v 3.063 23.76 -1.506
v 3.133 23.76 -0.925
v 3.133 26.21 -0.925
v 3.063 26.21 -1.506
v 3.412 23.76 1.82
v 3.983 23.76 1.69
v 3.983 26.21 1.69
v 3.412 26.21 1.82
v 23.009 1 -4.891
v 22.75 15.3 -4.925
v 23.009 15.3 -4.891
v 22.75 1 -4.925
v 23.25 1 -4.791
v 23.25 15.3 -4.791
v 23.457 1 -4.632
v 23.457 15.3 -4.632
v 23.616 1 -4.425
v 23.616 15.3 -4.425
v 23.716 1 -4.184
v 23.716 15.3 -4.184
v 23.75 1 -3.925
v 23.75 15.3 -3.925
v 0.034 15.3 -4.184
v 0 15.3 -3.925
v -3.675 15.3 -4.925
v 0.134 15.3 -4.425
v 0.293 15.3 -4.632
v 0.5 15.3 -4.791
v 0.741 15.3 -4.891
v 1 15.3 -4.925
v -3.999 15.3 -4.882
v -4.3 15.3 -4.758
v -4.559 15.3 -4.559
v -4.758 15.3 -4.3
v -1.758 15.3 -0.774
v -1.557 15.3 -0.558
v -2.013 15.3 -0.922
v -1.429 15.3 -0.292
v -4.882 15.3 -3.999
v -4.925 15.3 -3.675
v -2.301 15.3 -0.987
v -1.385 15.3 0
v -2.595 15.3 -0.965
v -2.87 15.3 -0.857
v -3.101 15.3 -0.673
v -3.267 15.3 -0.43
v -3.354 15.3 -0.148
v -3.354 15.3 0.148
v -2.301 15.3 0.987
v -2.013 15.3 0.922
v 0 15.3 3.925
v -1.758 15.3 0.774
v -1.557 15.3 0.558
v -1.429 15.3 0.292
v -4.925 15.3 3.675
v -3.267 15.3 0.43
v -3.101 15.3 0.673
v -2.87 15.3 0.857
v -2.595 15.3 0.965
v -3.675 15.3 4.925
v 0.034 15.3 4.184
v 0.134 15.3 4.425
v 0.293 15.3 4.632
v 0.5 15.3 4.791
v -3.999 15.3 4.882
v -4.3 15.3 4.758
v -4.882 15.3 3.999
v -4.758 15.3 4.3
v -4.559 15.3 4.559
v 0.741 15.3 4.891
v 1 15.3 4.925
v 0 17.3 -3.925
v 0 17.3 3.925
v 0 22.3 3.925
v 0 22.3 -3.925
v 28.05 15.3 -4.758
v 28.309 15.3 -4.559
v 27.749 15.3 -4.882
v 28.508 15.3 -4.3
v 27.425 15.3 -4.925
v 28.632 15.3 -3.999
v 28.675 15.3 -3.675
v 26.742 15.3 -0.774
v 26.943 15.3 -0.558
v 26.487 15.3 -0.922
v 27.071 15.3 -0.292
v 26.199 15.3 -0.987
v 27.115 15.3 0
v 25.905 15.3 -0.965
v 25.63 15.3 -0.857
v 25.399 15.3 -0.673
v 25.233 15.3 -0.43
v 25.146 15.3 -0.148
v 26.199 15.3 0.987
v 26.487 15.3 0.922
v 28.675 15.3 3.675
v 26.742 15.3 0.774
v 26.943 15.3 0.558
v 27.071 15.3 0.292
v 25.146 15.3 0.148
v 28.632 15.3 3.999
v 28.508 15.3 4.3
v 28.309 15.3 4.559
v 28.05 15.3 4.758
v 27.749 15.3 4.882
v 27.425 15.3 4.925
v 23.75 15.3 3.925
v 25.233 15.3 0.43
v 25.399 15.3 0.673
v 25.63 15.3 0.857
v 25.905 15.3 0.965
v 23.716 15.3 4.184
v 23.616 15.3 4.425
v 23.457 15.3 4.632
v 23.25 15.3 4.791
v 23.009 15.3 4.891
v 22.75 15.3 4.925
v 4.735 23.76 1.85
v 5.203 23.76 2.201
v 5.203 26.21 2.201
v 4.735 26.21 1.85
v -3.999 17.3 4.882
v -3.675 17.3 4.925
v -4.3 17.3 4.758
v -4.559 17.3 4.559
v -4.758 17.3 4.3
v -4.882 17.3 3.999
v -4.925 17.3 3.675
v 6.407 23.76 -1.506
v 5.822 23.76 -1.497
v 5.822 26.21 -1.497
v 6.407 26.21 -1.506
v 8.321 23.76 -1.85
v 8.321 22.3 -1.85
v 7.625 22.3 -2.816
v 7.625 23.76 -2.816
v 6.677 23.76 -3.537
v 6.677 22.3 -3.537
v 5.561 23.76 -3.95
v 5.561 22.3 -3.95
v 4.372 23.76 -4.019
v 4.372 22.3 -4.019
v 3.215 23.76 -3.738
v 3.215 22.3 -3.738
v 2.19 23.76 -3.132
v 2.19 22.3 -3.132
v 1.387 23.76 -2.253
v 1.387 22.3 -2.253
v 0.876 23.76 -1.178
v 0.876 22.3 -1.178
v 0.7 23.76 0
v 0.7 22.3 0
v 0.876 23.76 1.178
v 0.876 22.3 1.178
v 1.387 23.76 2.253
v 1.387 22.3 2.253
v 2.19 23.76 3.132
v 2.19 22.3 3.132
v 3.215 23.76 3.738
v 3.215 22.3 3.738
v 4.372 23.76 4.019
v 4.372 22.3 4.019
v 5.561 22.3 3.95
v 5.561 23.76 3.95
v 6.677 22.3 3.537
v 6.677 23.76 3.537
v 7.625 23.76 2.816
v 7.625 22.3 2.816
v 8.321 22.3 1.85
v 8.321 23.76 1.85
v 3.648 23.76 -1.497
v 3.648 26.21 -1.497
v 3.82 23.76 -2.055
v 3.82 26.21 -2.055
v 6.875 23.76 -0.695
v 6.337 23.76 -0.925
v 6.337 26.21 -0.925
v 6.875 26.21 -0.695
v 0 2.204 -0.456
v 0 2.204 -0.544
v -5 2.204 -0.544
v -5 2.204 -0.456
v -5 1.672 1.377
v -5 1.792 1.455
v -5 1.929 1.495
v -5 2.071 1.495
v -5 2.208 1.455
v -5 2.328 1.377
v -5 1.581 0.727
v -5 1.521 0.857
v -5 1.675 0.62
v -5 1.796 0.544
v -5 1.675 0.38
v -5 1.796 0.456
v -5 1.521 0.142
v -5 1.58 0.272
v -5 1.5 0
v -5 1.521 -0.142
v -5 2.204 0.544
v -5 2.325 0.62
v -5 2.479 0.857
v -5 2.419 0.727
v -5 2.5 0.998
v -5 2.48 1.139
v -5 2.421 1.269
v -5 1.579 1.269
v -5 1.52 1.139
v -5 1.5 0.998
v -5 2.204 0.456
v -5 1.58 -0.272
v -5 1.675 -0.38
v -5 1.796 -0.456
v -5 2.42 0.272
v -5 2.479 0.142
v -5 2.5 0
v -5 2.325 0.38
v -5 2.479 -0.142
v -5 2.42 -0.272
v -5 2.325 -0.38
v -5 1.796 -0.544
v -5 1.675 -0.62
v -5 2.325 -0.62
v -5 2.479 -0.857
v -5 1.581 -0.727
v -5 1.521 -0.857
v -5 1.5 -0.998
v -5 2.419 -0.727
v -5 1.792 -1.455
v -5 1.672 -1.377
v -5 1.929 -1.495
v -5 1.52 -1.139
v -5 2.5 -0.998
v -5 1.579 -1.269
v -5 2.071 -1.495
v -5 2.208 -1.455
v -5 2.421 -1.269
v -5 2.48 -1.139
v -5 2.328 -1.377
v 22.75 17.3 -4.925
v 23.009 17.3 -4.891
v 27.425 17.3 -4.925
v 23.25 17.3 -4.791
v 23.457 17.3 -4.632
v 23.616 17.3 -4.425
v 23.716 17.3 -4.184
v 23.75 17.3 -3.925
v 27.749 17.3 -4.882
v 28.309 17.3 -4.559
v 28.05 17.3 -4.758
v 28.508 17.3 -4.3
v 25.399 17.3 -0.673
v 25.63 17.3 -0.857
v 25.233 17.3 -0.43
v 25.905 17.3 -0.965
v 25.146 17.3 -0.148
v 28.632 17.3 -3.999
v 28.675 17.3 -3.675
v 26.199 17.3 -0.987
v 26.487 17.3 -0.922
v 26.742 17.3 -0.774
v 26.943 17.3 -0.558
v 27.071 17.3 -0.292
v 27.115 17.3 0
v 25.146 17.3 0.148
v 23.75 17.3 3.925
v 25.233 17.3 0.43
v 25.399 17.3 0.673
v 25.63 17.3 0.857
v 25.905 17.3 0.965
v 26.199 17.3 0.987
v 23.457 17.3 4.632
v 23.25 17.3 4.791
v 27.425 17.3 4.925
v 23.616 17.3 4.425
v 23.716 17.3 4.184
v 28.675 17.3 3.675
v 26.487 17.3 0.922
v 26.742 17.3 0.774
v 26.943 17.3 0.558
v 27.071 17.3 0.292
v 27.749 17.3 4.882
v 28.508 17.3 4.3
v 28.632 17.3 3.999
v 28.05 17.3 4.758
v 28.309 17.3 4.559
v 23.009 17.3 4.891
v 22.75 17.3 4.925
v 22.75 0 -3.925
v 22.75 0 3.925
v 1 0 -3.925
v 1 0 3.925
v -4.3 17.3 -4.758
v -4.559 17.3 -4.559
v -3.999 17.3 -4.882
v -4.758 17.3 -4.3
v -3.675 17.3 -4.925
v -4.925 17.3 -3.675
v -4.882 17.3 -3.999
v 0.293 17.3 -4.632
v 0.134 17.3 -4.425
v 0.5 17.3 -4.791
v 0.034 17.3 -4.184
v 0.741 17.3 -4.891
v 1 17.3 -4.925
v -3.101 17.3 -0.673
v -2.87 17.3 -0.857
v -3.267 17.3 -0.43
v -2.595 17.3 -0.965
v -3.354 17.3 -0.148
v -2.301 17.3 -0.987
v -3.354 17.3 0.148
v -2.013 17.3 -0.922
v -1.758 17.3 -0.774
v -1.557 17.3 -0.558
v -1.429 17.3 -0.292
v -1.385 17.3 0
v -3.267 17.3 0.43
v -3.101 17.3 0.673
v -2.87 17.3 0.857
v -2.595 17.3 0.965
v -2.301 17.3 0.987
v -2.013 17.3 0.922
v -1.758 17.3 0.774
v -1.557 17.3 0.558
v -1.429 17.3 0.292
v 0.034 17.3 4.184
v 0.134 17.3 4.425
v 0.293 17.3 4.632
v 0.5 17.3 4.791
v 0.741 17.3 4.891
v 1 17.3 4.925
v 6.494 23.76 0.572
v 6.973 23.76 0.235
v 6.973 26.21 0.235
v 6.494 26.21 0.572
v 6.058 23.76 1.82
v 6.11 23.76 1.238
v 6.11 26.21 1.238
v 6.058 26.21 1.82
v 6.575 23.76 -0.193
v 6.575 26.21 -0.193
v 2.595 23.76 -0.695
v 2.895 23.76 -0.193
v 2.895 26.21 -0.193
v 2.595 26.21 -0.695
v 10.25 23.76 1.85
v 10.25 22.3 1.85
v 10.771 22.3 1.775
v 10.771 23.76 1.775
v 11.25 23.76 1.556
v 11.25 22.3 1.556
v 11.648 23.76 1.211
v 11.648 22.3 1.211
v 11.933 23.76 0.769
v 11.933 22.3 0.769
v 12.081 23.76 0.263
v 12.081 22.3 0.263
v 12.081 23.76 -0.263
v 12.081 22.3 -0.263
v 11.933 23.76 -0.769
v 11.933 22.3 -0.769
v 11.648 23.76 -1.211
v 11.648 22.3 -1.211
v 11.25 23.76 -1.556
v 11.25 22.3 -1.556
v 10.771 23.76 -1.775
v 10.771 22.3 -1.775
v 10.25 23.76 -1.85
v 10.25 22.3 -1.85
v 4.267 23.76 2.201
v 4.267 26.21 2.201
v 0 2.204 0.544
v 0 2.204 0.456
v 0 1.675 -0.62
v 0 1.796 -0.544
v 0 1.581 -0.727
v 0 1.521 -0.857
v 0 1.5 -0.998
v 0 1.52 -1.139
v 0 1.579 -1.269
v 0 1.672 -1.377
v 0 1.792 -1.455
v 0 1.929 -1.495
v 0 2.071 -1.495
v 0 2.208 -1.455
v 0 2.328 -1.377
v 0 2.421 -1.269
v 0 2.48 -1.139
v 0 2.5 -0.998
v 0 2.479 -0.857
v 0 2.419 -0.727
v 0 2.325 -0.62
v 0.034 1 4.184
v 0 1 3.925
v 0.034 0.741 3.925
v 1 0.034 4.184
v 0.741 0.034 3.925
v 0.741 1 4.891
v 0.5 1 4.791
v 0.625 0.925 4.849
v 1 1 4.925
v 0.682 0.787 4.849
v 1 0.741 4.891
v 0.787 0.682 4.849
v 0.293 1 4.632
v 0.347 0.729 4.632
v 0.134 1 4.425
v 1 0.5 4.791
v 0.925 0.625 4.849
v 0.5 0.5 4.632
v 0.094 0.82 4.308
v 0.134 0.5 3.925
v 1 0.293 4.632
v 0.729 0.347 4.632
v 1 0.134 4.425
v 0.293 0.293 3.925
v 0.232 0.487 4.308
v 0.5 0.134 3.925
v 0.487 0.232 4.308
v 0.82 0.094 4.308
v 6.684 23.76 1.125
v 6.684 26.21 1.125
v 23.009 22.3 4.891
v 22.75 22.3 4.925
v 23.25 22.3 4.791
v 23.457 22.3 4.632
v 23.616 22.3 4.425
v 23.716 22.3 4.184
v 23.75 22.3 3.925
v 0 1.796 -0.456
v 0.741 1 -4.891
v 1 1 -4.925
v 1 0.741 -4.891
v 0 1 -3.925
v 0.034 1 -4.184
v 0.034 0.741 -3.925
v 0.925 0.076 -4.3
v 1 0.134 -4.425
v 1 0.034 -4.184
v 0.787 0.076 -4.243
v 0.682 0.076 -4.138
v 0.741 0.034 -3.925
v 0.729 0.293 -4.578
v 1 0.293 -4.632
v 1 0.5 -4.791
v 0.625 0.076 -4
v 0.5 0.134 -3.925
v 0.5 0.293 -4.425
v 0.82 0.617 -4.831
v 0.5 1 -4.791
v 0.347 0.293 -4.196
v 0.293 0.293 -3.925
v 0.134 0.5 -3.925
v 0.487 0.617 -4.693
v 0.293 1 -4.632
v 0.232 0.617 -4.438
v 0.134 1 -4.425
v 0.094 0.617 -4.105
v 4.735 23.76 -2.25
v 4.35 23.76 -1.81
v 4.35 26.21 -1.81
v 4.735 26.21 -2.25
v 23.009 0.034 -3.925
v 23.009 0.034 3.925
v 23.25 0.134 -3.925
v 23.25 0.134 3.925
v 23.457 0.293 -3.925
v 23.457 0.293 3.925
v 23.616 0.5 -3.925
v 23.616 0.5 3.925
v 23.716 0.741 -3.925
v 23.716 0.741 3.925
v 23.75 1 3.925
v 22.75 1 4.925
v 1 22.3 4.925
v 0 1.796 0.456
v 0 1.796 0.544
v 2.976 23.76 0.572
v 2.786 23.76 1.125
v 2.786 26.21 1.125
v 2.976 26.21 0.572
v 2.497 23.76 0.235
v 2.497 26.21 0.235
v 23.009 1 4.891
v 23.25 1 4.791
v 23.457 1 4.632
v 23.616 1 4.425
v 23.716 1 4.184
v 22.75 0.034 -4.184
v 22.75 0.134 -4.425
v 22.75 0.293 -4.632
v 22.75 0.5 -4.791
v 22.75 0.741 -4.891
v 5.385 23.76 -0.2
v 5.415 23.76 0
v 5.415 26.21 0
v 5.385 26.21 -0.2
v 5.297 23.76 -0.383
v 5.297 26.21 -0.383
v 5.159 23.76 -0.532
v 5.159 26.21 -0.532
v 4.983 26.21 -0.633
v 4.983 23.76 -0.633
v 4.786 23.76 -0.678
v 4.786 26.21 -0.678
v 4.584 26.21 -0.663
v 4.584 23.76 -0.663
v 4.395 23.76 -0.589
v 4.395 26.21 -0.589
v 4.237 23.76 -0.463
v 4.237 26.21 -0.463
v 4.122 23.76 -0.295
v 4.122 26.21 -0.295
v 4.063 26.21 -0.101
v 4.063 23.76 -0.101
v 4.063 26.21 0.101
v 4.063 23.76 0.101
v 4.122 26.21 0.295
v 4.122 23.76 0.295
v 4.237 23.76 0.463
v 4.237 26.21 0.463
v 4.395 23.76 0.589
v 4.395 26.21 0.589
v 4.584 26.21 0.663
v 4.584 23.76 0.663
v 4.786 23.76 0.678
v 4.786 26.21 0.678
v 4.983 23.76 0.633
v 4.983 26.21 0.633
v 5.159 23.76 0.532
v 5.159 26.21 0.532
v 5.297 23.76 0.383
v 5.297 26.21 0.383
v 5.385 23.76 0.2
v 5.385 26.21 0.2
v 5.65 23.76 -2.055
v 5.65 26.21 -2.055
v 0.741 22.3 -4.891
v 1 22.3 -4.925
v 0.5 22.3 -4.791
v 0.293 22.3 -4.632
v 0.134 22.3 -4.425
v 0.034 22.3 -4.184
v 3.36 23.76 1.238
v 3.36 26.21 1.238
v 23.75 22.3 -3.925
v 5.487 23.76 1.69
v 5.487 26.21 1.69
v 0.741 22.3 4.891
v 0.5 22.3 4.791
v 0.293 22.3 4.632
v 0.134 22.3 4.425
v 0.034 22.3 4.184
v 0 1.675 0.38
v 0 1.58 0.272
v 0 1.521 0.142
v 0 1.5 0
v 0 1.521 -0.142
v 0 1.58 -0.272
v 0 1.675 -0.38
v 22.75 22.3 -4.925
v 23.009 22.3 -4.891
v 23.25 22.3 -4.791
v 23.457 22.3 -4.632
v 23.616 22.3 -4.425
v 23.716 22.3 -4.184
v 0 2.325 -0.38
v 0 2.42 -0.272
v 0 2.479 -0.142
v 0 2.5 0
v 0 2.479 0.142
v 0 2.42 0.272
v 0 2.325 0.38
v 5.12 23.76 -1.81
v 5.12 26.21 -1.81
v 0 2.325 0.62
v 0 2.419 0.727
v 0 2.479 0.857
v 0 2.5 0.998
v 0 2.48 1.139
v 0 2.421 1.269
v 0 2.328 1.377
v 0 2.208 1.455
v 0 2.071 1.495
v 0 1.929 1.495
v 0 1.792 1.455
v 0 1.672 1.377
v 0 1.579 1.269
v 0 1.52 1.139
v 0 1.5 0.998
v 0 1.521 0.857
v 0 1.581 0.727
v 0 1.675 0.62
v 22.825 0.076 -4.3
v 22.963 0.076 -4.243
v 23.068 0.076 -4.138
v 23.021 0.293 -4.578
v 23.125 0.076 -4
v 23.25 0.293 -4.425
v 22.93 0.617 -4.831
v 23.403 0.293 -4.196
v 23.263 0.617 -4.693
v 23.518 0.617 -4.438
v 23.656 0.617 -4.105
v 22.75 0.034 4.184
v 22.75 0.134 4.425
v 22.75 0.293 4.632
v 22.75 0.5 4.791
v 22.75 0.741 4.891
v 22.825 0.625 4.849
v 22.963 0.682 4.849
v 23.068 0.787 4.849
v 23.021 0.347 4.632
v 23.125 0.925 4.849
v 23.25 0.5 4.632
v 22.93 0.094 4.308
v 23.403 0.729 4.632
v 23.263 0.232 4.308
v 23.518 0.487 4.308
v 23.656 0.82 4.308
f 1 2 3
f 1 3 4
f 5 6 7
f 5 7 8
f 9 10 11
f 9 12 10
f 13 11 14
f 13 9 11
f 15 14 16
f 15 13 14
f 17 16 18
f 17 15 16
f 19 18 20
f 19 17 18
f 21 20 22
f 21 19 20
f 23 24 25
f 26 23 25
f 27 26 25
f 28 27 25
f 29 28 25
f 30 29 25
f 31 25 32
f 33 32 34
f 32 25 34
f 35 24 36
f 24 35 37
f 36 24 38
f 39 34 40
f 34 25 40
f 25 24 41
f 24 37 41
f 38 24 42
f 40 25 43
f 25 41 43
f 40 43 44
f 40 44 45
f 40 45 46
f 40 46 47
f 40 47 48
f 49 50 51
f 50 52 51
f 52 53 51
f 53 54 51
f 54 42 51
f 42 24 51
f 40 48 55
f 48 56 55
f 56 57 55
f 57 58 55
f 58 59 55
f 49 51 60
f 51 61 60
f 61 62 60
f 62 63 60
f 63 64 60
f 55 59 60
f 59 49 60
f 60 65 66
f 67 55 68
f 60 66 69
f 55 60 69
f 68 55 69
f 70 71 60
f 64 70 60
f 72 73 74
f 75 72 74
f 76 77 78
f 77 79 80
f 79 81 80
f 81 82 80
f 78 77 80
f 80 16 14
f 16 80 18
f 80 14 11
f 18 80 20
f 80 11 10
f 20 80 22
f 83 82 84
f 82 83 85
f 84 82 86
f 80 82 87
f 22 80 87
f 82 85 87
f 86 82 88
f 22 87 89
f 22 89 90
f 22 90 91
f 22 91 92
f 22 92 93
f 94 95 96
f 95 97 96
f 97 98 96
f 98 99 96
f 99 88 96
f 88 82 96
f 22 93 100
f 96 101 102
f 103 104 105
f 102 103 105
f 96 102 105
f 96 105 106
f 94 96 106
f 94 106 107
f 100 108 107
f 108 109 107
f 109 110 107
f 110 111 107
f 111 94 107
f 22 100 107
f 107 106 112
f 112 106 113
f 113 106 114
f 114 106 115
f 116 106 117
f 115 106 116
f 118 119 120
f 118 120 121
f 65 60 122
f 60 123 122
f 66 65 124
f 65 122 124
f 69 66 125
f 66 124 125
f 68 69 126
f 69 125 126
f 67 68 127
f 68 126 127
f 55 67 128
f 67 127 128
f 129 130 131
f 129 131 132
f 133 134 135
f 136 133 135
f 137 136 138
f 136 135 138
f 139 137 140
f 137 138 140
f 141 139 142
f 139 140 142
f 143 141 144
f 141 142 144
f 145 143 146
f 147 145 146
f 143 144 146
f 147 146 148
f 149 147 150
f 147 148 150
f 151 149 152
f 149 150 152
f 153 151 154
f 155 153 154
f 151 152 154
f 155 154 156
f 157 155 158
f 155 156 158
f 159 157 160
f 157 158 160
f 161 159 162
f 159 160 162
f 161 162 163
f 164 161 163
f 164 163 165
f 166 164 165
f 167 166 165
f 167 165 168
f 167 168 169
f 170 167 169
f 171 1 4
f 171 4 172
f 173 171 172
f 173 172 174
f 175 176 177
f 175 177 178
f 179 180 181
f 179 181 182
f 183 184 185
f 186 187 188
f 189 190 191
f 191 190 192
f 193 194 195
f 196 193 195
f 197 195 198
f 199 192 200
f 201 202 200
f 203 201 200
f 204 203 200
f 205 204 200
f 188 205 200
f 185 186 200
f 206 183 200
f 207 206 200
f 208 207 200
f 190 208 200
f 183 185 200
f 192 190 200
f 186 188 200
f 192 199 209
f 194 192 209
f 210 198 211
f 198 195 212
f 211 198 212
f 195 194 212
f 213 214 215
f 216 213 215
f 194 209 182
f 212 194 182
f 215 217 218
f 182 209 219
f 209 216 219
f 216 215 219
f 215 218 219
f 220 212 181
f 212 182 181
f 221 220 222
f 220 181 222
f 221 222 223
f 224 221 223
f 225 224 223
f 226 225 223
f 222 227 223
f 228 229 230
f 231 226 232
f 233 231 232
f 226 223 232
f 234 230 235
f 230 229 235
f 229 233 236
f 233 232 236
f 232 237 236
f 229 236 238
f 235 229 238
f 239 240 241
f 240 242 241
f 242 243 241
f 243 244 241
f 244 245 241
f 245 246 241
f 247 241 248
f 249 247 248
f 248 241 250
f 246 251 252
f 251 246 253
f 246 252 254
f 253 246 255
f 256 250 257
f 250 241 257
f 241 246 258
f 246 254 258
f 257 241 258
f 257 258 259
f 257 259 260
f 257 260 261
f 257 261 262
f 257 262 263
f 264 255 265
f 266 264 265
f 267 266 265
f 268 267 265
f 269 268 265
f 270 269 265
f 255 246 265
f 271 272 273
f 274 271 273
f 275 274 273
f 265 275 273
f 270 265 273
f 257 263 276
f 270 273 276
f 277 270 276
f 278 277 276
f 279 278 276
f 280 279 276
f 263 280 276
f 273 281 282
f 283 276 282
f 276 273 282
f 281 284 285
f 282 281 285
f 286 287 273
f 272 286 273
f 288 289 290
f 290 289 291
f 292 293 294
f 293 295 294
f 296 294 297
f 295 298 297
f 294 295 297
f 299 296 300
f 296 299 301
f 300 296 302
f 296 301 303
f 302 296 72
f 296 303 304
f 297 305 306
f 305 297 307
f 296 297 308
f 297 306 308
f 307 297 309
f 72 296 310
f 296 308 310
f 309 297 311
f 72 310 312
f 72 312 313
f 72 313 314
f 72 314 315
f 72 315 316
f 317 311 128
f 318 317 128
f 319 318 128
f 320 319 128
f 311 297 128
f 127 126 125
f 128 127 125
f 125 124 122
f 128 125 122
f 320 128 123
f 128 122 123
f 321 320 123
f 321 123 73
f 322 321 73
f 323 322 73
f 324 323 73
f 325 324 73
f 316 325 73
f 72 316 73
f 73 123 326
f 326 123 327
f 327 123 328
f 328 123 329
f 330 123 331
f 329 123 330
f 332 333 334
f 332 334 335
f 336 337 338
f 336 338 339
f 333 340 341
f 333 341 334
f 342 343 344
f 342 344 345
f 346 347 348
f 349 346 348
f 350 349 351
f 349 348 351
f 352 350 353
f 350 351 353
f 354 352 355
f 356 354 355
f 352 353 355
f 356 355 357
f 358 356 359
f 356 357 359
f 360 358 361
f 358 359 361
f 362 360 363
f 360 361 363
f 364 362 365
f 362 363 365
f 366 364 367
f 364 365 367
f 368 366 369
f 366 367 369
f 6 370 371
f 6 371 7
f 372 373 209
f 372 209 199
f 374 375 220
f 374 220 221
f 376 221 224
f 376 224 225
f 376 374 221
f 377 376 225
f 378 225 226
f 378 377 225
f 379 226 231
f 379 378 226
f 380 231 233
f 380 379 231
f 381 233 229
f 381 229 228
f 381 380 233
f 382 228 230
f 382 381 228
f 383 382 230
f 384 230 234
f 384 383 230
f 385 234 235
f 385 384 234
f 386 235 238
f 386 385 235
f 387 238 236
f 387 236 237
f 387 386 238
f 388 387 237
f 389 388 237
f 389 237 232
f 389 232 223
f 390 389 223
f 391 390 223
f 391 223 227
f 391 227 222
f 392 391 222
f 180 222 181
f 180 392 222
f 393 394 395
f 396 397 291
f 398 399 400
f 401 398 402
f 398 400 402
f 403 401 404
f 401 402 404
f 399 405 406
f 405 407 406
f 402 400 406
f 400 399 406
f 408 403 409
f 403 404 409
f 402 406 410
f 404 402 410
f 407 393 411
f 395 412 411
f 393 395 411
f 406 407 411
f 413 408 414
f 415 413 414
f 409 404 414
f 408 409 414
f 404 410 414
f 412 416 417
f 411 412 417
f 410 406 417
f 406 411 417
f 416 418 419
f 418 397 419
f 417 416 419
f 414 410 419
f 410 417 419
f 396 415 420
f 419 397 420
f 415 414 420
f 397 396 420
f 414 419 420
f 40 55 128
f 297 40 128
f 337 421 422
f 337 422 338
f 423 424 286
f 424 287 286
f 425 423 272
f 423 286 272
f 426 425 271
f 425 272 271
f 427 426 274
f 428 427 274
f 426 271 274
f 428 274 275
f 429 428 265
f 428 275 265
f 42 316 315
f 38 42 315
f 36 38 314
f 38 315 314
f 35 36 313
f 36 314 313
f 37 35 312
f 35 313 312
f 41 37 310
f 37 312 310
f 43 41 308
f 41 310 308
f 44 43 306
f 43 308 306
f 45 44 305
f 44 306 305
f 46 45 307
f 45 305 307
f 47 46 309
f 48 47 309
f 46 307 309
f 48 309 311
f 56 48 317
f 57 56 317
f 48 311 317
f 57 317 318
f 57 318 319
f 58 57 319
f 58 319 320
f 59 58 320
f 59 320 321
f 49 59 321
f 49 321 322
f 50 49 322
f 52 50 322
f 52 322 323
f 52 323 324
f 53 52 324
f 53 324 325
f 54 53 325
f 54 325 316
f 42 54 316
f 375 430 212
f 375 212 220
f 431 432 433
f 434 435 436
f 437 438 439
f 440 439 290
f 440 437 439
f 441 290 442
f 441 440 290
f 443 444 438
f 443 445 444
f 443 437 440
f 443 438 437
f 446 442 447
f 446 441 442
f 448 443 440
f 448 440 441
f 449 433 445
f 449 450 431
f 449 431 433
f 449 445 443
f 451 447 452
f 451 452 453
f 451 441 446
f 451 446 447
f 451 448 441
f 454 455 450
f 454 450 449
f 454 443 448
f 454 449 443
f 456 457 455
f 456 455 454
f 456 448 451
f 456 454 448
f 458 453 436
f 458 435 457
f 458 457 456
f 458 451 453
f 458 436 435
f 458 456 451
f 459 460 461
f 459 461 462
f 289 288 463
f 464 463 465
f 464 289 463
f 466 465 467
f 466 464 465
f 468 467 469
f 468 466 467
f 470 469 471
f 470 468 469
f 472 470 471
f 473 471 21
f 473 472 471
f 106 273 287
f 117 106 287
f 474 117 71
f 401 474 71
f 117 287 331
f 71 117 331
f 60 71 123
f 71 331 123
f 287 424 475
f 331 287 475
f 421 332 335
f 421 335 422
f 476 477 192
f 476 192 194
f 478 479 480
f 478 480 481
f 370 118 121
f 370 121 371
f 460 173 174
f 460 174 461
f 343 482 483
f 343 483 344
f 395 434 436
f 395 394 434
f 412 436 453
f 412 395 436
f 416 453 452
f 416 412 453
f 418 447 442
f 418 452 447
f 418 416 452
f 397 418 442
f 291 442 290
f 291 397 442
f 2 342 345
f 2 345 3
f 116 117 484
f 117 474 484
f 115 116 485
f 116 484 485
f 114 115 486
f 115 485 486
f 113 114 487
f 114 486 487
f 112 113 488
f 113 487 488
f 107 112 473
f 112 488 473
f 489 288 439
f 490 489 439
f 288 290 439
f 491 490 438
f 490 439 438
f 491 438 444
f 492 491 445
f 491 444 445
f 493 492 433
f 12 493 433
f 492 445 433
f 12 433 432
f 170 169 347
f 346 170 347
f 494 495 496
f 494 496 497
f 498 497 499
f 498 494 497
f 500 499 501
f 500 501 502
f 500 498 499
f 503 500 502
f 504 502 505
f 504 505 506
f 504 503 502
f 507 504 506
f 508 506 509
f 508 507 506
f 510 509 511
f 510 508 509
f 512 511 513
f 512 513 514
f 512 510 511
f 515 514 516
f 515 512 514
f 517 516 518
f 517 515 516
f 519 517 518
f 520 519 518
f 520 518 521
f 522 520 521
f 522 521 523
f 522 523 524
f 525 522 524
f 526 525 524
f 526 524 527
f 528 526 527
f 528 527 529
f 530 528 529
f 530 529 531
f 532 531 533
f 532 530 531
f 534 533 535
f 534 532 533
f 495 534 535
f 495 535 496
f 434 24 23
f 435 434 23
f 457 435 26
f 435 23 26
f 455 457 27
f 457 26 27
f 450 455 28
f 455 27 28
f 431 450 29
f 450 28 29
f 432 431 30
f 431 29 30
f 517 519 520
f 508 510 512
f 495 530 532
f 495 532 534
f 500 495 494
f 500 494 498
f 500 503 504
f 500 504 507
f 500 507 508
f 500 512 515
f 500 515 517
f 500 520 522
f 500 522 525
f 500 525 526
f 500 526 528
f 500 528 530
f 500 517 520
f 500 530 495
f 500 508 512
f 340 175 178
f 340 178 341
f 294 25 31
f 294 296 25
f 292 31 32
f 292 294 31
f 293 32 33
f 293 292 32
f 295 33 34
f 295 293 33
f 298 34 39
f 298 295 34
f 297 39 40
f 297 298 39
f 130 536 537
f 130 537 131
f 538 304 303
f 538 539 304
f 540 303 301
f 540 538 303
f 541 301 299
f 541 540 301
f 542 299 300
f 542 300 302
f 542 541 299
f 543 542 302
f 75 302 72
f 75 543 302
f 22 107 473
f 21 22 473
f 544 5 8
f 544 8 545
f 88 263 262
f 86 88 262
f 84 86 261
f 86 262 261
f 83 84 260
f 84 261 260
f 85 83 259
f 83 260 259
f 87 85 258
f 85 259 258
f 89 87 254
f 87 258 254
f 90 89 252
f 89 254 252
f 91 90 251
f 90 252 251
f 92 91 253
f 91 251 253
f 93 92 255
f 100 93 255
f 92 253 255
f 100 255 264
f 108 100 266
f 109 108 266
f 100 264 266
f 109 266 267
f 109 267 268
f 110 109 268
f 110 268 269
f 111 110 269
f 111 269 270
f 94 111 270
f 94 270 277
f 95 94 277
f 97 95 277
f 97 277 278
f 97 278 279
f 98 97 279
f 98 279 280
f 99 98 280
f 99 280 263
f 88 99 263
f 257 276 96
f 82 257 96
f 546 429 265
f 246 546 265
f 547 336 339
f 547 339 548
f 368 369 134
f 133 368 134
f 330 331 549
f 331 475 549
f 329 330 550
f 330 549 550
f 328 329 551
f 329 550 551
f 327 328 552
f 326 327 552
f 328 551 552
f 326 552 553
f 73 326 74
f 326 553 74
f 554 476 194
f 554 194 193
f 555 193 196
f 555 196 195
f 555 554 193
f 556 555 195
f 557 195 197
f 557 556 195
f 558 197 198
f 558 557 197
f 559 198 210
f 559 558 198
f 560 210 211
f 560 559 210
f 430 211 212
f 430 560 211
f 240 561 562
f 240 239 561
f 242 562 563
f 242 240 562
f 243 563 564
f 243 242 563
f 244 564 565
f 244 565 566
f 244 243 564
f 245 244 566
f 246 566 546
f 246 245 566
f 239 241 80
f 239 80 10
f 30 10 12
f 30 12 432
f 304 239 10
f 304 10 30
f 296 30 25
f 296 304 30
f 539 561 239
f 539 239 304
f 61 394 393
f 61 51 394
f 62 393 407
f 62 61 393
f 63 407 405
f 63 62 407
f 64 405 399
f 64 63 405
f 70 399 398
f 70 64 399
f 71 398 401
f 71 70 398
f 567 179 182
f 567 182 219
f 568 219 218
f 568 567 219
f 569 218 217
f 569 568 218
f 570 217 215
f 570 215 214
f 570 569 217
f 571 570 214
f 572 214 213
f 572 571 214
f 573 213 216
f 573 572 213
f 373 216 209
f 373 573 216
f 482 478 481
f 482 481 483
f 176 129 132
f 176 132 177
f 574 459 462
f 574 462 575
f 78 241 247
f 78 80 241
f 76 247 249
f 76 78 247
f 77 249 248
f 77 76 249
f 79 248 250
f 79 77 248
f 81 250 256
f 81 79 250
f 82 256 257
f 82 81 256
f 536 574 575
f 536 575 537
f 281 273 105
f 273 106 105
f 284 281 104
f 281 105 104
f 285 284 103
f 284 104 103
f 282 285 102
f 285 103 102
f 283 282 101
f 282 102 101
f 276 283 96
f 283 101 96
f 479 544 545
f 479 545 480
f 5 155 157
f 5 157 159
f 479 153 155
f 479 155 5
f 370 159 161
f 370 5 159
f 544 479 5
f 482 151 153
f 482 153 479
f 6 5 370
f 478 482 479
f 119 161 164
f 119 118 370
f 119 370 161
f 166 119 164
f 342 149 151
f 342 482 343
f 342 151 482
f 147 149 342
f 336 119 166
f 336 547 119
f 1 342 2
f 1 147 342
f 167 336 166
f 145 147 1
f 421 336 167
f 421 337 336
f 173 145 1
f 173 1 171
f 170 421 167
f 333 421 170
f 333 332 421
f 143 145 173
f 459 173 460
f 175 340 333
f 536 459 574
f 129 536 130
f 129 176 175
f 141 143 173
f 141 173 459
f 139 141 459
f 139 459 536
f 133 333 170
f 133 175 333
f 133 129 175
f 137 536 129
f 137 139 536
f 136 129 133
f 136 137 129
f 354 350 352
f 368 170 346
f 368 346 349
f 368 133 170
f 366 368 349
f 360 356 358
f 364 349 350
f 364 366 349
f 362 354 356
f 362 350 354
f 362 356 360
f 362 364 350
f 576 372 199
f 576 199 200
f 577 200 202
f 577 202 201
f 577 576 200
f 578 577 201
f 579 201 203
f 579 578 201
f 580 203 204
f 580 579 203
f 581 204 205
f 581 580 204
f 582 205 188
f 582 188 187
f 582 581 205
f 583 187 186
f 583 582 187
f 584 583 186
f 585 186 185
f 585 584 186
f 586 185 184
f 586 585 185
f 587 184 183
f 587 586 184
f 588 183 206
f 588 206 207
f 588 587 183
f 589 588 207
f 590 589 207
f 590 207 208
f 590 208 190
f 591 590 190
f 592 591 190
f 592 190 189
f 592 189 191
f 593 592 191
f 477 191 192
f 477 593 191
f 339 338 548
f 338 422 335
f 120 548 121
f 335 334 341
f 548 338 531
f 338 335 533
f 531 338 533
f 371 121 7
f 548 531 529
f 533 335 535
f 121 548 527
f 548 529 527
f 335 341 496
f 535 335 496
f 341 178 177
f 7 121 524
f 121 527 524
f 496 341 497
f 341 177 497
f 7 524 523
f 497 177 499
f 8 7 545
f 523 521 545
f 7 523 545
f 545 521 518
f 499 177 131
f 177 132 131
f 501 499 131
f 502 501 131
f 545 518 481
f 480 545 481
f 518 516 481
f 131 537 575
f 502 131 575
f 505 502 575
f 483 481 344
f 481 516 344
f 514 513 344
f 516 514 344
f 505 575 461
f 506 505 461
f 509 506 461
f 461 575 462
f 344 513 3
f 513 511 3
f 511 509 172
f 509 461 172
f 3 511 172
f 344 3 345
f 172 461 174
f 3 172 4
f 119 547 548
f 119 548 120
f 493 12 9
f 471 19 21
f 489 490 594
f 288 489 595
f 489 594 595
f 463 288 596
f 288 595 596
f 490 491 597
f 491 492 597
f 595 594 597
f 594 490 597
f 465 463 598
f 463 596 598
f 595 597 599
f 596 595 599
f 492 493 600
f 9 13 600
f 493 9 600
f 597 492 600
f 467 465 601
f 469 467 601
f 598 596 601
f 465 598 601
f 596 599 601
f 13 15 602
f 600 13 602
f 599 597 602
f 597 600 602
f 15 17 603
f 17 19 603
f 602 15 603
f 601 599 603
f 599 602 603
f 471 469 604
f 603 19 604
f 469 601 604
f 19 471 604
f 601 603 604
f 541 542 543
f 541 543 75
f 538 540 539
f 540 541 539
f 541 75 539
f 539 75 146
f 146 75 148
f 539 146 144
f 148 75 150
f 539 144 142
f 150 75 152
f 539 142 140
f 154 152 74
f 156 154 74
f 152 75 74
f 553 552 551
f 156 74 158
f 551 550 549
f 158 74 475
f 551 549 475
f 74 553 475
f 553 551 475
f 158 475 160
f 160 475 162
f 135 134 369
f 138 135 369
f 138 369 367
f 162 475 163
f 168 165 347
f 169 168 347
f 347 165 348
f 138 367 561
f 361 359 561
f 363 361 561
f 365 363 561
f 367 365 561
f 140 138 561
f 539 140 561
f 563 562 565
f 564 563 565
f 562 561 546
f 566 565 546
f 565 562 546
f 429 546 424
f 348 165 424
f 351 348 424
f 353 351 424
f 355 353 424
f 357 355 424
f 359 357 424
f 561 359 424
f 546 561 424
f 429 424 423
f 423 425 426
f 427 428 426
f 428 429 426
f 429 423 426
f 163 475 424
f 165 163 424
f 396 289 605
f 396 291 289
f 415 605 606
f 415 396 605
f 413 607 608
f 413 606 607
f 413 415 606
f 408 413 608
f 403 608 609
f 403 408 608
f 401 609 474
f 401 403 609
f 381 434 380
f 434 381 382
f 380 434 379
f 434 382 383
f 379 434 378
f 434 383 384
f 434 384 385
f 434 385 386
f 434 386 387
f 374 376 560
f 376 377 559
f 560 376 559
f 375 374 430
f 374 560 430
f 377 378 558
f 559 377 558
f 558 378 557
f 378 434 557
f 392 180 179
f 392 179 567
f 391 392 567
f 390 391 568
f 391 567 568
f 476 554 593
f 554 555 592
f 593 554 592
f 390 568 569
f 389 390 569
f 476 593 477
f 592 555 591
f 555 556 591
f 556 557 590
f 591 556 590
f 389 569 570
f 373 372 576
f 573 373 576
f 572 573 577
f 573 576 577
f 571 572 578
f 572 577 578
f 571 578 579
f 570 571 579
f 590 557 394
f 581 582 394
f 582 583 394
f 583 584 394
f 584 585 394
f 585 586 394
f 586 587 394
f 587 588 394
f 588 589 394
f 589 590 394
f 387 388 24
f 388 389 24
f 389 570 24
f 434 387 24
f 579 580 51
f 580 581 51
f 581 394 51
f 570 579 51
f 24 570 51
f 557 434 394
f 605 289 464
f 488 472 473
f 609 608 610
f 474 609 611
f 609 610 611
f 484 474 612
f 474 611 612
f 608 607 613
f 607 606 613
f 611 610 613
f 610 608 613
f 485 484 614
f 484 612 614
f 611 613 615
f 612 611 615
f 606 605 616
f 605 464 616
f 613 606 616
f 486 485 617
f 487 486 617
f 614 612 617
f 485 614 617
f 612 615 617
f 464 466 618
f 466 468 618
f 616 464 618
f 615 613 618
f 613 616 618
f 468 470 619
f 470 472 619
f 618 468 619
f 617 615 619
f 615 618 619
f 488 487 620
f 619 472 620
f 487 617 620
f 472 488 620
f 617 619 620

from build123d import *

# Parameters (mm, degrees)
BOSS_EXTRUDE1_DEPTH = 4.925
BOSS_EXTRUDE3_DEPTH = 1.46
SKETCH6_R           = 0.68
BOSS_EXTRUDE4_DEPTH = 2.45
SKETCH2_R           = 0.99
CUT_EXTRUDE6_DEPTH  = 10
FILLET1_R           = 1
FILLET2_R           = 1.25
BOSS_EXTRUDE5_DEPTH = 5


with BuildPart() as part:
    # Sketch1 → Boss-Extrude1 (new body, symmetric)
    with BuildSketch(Plane.XY):
        Polygon((0, 0), (0, 15.3), (-4.925, 15.3), (-4.925, 17.3), (0, 17.3), (0, 22.3), (23.75, 22.3), (23.75, 17.3), (28.675, 17.3), (28.675, 15.3), (23.75, 15.3), (23.75, 0), align=None)
    extrude(amount=BOSS_EXTRUDE1_DEPTH, both=True)

    # Sketch5 → Boss-Extrude3 (add)
    with BuildSketch(Plane(origin=(0, 22.3, 0), x_dir=(1, 0, 0), z_dir=(0, 1, 0))):
        with BuildLine():
            Line((10.25, 1.85), (8.32090644, 1.85))
            ThreePointArc((8.32090644, 1.85), (0.7, 0), (8.32090644, -1.85))
            Line((8.32090644, -1.85), (10.25, -1.85))
            ThreePointArc((10.25, -1.85), (12.1, 0), (10.25, 1.85))
        make_face()
    extrude(amount=BOSS_EXTRUDE3_DEPTH)

    # Sketch6 → Boss-Extrude4 (add)
    with BuildSketch(Plane(origin=(0, 23.76, 0), x_dir=(1, 0, 0), z_dir=(0, 1, 0))):
        Polygon((4.350363372, 1.809573061), (4.735, 2.25), (5.119636628, 1.809573061), (5.650157447, 2.05547728), (5.822402717, 1.49668144), (6.407075857, 1.505543864), (6.337146997, 0.925), (6.874877162, 0.695288237), (6.574865506, 0.193377657), (6.972674265, -0.235189042), (6.494454555, -0.57168144), (6.683557159, -1.125), (6.109817927, -1.237891622), (6.057516818, -1.820288237), (5.48746279, -1.690059097), (5.202801304, -2.200832102), (4.735, -1.85), (4.267198696, -2.200832102), (3.98253721, -1.690059097), (3.412483182, -1.820288237), (3.360182073, -1.237891622), (2.786442841, -1.125), (2.975545445, -0.57168144), (2.497325735, -0.235189042), (2.895134494, 0.193377657), (2.595122838, 0.695288237), (3.132853003, 0.925), (3.062924143, 1.505543864), (3.647597283, 1.49668144), (3.819842553, 2.05547728), align=None)
        with Locations((4.735, 0)):
            Circle(SKETCH6_R, mode=Mode.SUBTRACT)
    extrude(amount=BOSS_EXTRUDE4_DEPTH)

    # Sketch2 → Cut-Extrude6 (cut)
    with BuildSketch(Plane(origin=(0, 17.3, 0), x_dir=(1, 0, 0), z_dir=(0, 1, 0))):
        with Locations((26.125, 0)):
            Circle(SKETCH2_R)
        with Locations((-2.375, 0)):
            Circle(SKETCH2_R)
    extrude(amount=-CUT_EXTRUDE6_DEPTH, mode=Mode.SUBTRACT)

    # Fillet1
    fillet1_edges = [part.edges().sort_by_distance(p)[0] for p in [
        (0, 7.65, -4.925),
        (0, 19.8, -4.925),
        (23.75, 19.8, -4.925),
        (23.75, 7.65, -4.925),
        (11.875, 0, -4.925),
        (23.75, 19.8, 4.925),
        (0, 0, 0),
        (23.75, 0, 0),
        (0, 19.8, 4.925),
        (0, 7.65, 4.925),
        (11.875, 0, 4.925),
        (23.75, 7.65, 4.925),
    ]]
    fillet(fillet1_edges, radius=FILLET1_R)

    # Fillet2
    fillet2_edges = [part.edges().sort_by_distance(p)[0] for p in [
        (-4.925, 16.3, -4.925),
        (28.675, 16.3, 4.925),
        (28.675, 16.3, -4.925),
        (-4.925, 16.3, 4.925),
    ]]
    fillet(fillet2_edges, radius=FILLET2_R)

    # Sketch7 → Boss-Extrude5 (add)
    with BuildSketch(Plane.ZY):
        with BuildLine():
            Line((-0.543660539, 2.20433868), (-0.456339461, 2.20433868))
            ThreePointArc((-0.456339461, 2.20433868), (0, 2.5), (0.456339461, 2.20433868))
            Line((0.456339461, 2.20433868), (0.543660539, 2.20433868))
            ThreePointArc((0.543660539, 2.20433868), (1.5, 2), (0.543660539, 1.79566132))
            Line((0.543660539, 1.79566132), (0.456339461, 1.79566132))
            ThreePointArc((0.456339461, 1.79566132), (0, 1.5), (-0.456339461, 1.79566132))
            Line((-0.456339461, 1.79566132), (-0.543660539, 1.79566132))
            ThreePointArc((-0.543660539, 1.79566132), (-1.5, 2), (-0.543660539, 2.20433868))
        make_face()
    extrude(amount=BOSS_EXTRUDE5_DEPTH)


solid = part.part
